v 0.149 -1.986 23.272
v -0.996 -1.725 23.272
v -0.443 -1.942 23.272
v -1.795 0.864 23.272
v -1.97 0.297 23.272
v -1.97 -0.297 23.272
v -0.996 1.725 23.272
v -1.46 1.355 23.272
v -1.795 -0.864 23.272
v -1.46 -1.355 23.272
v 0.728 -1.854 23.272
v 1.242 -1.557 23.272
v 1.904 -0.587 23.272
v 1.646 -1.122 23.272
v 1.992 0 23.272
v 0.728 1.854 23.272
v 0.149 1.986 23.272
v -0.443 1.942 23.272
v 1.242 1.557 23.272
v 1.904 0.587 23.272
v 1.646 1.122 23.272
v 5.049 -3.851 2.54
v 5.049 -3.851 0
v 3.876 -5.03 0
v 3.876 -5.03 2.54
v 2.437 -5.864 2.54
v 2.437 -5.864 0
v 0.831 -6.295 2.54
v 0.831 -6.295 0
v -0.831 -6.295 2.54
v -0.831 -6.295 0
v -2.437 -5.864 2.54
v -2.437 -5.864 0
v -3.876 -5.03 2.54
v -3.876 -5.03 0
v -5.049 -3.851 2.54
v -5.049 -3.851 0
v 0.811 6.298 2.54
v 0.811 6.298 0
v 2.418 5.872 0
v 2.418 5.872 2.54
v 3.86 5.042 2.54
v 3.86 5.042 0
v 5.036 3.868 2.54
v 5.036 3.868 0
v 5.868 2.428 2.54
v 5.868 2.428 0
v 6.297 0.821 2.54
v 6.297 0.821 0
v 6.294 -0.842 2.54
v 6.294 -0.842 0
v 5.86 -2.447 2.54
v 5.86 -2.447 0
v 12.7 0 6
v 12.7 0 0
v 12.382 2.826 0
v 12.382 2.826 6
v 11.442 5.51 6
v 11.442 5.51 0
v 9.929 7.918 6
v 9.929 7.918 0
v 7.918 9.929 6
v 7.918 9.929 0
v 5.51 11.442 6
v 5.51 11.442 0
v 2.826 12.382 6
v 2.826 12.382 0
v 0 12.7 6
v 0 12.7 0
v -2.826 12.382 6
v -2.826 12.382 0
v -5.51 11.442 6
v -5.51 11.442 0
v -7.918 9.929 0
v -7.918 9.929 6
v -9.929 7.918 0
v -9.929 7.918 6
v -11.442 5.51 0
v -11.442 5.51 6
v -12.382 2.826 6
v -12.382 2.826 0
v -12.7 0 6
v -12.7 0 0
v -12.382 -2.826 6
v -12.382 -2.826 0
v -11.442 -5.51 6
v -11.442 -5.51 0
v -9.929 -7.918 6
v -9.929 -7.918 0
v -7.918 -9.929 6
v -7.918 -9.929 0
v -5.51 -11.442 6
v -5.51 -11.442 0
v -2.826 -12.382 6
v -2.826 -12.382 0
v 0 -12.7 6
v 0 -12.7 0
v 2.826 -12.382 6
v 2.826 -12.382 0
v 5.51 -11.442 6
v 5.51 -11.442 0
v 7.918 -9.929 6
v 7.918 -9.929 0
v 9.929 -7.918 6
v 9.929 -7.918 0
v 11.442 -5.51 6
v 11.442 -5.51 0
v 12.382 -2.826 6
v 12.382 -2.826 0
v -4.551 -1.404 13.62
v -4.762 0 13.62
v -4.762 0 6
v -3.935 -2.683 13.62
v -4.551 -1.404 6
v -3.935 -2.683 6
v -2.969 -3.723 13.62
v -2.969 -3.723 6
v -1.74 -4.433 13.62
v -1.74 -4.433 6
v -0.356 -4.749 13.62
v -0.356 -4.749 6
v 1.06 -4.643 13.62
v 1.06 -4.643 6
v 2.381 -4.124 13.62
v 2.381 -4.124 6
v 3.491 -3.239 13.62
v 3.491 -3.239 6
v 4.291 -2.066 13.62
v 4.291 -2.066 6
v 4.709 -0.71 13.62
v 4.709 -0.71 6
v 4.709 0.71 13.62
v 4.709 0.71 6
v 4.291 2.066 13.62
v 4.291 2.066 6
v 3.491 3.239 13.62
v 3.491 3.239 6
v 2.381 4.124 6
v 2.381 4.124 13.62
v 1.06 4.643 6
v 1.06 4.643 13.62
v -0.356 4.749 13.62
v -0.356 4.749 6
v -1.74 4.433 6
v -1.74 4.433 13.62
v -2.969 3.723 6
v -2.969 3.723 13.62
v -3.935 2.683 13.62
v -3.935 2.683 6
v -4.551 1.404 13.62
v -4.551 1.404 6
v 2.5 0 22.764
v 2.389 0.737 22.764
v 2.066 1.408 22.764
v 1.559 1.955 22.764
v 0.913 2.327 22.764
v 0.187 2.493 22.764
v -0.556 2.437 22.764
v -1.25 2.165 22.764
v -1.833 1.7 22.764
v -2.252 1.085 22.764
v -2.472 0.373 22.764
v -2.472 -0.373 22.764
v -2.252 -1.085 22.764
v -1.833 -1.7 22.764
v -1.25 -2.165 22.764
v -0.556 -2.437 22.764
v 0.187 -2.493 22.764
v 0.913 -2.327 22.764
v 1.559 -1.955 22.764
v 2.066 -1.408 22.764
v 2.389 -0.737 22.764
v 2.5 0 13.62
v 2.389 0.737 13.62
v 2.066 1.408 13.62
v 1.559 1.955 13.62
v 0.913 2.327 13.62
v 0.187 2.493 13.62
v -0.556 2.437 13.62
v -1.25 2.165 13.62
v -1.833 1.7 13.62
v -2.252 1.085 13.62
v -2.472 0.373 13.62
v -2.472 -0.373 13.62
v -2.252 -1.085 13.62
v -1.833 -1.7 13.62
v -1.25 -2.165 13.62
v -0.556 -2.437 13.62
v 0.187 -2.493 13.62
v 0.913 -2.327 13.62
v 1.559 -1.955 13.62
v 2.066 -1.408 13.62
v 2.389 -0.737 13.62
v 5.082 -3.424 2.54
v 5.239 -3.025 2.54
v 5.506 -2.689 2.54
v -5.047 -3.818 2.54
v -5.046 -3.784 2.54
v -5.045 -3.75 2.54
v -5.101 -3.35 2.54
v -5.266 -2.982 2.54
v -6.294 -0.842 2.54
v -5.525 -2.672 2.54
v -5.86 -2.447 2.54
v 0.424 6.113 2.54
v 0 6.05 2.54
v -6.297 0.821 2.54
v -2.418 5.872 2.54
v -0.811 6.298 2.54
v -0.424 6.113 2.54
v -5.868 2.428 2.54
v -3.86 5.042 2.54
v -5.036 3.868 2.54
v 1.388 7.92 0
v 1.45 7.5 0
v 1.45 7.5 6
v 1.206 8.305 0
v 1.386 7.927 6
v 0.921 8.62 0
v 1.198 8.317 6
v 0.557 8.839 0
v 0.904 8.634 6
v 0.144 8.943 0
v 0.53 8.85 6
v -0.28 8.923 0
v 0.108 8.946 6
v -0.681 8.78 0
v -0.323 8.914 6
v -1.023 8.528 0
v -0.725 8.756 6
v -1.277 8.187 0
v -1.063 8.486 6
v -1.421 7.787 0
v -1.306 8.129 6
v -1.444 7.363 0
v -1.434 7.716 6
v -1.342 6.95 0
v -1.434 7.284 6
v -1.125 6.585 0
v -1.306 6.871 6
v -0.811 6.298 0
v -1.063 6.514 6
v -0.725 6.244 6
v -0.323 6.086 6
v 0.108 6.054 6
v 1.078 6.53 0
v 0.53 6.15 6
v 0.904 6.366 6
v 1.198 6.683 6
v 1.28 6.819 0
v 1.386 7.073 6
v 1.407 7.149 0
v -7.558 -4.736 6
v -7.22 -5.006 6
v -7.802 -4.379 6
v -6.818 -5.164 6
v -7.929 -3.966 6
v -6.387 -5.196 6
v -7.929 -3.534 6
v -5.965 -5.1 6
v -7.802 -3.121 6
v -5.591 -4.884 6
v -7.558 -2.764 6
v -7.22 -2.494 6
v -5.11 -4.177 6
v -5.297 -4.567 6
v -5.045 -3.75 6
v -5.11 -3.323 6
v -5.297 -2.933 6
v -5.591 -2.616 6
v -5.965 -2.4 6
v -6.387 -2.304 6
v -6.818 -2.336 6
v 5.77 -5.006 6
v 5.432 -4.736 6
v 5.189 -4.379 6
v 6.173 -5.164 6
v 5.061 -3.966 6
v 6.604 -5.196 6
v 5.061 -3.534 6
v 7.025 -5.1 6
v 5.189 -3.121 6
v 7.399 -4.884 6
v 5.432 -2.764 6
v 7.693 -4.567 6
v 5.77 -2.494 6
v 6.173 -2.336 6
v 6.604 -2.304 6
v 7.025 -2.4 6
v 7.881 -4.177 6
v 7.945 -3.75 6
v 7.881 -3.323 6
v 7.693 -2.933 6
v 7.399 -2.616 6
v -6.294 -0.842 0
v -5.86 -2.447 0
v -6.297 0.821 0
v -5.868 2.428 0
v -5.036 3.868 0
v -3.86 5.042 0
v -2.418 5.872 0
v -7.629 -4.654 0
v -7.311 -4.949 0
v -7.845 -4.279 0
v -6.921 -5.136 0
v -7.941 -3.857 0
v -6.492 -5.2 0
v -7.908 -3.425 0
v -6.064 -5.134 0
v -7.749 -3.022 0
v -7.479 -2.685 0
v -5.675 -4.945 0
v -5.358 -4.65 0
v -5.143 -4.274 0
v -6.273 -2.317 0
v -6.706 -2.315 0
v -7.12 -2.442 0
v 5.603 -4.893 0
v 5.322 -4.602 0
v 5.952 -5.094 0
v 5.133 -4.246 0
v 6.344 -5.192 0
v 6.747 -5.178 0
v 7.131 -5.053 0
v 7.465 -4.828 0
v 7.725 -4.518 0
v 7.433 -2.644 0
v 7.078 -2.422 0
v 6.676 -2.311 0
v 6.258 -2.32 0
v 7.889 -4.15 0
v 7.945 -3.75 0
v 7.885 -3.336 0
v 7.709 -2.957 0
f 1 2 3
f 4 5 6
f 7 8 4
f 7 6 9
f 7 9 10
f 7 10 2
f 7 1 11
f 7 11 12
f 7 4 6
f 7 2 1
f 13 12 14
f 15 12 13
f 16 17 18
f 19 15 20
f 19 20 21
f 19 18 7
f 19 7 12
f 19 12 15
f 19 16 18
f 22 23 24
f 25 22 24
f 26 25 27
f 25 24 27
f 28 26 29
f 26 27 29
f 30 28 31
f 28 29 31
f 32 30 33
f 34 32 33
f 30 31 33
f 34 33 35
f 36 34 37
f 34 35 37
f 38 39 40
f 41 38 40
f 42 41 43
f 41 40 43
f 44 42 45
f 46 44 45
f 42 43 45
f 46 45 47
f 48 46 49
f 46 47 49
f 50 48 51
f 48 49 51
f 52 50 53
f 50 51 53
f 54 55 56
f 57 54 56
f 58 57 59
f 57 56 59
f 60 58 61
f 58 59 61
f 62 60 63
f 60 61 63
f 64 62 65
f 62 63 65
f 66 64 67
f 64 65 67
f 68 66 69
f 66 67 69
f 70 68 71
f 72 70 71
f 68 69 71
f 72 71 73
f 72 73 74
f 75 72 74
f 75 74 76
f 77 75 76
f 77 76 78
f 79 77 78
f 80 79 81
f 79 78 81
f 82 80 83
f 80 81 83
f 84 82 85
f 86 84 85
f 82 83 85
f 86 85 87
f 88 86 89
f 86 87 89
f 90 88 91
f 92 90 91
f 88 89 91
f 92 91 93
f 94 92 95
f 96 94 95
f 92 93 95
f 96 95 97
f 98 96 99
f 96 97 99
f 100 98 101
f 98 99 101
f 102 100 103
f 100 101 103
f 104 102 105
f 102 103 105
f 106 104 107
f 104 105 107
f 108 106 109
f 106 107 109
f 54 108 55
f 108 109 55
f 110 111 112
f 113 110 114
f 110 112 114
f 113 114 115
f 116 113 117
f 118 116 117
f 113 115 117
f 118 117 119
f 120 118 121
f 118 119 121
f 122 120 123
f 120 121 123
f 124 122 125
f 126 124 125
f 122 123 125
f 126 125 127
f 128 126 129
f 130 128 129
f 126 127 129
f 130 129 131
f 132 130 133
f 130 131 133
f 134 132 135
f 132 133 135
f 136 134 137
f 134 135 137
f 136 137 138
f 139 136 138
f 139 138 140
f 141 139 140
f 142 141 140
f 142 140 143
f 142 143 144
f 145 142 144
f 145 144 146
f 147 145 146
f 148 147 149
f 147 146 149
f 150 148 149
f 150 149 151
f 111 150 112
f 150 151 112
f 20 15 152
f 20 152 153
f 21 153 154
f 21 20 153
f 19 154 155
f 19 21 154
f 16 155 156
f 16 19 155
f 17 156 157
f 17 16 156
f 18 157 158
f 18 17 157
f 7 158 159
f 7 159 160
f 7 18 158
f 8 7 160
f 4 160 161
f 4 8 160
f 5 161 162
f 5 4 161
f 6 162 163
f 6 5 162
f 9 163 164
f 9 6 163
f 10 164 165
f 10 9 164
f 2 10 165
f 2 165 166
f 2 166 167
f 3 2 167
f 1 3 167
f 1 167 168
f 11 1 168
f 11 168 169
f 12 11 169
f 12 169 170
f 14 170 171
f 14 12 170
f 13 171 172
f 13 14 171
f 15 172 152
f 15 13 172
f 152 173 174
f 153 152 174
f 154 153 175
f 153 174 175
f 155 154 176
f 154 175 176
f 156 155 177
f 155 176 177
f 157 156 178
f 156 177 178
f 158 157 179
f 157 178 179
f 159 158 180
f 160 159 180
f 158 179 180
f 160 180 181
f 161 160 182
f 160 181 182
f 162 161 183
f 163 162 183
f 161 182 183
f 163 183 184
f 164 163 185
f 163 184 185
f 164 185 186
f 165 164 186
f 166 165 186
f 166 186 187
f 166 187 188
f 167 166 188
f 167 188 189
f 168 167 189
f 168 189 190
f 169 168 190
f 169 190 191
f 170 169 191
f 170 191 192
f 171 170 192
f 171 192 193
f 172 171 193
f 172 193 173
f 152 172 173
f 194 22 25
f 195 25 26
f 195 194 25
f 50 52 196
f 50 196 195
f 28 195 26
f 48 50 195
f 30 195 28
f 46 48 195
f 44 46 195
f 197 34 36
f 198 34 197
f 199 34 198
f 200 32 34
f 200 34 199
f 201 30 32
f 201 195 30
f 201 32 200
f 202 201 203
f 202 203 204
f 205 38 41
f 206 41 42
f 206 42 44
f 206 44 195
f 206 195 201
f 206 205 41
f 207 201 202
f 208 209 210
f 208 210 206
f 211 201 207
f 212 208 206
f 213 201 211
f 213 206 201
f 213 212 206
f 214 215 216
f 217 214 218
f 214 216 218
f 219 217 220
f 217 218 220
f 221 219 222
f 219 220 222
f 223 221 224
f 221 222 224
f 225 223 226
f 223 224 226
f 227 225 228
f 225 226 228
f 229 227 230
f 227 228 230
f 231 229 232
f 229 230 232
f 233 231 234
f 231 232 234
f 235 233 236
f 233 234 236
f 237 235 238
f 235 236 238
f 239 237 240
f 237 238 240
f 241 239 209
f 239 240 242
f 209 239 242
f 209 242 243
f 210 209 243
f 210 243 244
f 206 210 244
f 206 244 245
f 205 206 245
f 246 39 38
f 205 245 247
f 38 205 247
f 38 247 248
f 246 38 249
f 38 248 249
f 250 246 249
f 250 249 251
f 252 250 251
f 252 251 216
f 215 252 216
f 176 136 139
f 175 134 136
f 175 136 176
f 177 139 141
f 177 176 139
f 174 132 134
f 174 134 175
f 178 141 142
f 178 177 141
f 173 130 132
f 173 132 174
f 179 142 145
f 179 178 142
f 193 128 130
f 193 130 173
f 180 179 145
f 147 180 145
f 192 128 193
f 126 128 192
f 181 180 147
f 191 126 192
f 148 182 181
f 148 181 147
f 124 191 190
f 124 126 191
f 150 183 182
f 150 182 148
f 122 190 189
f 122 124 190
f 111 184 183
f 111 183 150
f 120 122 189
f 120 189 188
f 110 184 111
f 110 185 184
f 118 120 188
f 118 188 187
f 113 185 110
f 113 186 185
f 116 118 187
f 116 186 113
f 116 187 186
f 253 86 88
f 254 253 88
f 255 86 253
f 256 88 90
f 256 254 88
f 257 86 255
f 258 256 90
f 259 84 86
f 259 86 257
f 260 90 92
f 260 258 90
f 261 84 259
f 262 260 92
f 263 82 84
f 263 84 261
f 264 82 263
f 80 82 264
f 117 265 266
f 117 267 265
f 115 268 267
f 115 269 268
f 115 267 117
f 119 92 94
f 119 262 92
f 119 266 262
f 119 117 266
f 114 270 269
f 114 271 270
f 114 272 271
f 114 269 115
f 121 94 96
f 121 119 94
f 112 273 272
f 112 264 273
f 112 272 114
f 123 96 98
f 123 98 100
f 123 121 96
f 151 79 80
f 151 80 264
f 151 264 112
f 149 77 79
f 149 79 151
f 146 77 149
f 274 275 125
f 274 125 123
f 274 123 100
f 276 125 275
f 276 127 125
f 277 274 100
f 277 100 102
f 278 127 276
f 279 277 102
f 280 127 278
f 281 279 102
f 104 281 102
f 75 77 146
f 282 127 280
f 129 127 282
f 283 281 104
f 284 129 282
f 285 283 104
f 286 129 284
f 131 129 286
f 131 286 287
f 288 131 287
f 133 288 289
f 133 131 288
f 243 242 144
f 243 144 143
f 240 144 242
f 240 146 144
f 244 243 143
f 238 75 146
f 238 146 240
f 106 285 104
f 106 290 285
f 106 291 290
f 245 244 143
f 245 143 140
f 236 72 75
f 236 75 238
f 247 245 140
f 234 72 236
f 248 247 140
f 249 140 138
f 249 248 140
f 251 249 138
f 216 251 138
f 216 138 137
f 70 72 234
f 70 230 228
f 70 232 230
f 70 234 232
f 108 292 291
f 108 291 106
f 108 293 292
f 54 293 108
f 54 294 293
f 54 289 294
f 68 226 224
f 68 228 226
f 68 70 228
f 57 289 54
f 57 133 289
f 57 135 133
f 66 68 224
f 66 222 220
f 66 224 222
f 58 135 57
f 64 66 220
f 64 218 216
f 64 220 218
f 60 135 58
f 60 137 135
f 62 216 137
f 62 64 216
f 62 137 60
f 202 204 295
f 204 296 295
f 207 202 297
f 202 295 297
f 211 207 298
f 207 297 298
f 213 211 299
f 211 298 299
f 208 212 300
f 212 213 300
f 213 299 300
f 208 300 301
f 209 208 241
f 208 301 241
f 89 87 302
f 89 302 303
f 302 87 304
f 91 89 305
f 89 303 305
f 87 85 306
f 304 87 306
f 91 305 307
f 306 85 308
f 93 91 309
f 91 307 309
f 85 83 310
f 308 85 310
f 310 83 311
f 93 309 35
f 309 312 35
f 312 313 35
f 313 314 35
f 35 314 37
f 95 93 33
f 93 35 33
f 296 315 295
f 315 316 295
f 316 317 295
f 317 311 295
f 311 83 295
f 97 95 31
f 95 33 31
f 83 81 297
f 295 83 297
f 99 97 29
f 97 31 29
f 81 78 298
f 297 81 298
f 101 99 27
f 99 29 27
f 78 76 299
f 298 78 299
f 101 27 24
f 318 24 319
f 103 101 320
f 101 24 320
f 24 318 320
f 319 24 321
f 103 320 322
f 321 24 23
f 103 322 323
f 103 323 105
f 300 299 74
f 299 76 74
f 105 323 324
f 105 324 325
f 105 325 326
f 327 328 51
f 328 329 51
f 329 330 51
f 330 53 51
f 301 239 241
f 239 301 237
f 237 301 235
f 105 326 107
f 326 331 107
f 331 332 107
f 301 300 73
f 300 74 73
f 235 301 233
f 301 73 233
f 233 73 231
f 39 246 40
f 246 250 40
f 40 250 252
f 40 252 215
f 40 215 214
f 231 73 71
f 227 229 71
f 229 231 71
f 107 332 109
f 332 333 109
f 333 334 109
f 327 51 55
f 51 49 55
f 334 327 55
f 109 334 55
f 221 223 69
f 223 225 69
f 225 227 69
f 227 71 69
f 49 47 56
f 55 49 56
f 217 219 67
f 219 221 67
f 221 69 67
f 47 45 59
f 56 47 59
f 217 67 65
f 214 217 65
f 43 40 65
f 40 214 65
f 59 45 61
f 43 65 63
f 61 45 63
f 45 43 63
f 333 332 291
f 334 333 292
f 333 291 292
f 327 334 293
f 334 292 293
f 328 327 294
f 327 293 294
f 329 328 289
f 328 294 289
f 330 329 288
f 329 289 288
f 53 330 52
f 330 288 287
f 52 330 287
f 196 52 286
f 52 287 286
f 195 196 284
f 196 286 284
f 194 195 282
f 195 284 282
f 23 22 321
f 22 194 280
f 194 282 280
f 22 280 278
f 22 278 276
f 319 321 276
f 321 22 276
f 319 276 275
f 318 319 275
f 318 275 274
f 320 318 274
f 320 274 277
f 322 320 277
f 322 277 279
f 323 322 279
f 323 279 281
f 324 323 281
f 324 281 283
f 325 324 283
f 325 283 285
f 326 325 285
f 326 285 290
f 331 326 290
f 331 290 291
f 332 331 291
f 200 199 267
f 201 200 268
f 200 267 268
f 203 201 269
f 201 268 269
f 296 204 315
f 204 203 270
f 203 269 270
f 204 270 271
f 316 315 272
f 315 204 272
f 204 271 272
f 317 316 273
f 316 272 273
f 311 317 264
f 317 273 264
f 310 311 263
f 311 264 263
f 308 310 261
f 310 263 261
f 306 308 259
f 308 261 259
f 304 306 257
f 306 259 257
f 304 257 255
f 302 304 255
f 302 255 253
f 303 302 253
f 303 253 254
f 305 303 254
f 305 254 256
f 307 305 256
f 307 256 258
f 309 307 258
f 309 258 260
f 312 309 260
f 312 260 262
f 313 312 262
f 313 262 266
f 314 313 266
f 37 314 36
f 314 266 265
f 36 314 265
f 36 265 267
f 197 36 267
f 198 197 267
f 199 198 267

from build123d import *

# Parameters (mm, degrees)
SKETCH1_R                    = 12.7
MOUNTING_FLANGE_DEPTH        = 6
SKETCH3_R                    = 6.35
MOTOR_SHAFT_RELIEF_DEPTH     = 2.54
SKETCH4_R                    = 1.45
SCREW_CLEARANCE_HOLES_DEPTH  = 19.936208702
SKETCH2_R                    = 2.5
DRIVE_SHAFT_DEPTH            = 17.272
CHAMFER1_SIZE                = 0.508
SKETCH5_R                    = 4.7625
SHAFT_SUPPORT_SHOULDER_DEPTH = 7.62


with BuildPart() as part:
    # Sketch1 → Mounting Flange (new body)
    with BuildSketch(Plane.XY):
        Circle(SKETCH1_R)
    extrude(amount=MOUNTING_FLANGE_DEPTH)

    # Sketch3 → Motor Shaft Relief (cut)
    with BuildSketch(Plane(origin=(0, 0, 0), x_dir=(-1, 0, 0), z_dir=(0, 0, -1))):
        Circle(SKETCH3_R)
    extrude(amount=-MOTOR_SHAFT_RELIEF_DEPTH, mode=Mode.SUBTRACT)

    # Sketch4 → Screw Clearance Holes (cut, through all)
    with BuildSketch(Plane.XY.offset(6)):
        with Locations((0, 7.5)):
            Circle(SKETCH4_R)
        with Locations((6.495190528, -3.75)):
            Circle(SKETCH4_R)
        with Locations((-6.495190528, -3.75)):
            Circle(SKETCH4_R)
    extrude(amount=-SCREW_CLEARANCE_HOLES_DEPTH, mode=Mode.SUBTRACT)

    # Sketch2 → Drive Shaft (add)
    with BuildSketch(Plane.XY.offset(6)):
        Circle(SKETCH2_R)
    extrude(amount=DRIVE_SHAFT_DEPTH)

    # Chamfer1
    chamfer1_edges = [part.edges().sort_by_distance(p)[0] for p in [
        (-2.5, 0, 23.272),
    ]]
    chamfer(chamfer1_edges, length=CHAMFER1_SIZE)

    # Sketch5 → Shaft Support Shoulder (add)
    with BuildSketch(Plane.XY.offset(6)):
        with Locations(Location((0, 0, 0), (0, 0, 180))):
            Circle(SKETCH5_R)
    extrude(amount=SHAFT_SUPPORT_SHOULDER_DEPTH)


solid = part.part
